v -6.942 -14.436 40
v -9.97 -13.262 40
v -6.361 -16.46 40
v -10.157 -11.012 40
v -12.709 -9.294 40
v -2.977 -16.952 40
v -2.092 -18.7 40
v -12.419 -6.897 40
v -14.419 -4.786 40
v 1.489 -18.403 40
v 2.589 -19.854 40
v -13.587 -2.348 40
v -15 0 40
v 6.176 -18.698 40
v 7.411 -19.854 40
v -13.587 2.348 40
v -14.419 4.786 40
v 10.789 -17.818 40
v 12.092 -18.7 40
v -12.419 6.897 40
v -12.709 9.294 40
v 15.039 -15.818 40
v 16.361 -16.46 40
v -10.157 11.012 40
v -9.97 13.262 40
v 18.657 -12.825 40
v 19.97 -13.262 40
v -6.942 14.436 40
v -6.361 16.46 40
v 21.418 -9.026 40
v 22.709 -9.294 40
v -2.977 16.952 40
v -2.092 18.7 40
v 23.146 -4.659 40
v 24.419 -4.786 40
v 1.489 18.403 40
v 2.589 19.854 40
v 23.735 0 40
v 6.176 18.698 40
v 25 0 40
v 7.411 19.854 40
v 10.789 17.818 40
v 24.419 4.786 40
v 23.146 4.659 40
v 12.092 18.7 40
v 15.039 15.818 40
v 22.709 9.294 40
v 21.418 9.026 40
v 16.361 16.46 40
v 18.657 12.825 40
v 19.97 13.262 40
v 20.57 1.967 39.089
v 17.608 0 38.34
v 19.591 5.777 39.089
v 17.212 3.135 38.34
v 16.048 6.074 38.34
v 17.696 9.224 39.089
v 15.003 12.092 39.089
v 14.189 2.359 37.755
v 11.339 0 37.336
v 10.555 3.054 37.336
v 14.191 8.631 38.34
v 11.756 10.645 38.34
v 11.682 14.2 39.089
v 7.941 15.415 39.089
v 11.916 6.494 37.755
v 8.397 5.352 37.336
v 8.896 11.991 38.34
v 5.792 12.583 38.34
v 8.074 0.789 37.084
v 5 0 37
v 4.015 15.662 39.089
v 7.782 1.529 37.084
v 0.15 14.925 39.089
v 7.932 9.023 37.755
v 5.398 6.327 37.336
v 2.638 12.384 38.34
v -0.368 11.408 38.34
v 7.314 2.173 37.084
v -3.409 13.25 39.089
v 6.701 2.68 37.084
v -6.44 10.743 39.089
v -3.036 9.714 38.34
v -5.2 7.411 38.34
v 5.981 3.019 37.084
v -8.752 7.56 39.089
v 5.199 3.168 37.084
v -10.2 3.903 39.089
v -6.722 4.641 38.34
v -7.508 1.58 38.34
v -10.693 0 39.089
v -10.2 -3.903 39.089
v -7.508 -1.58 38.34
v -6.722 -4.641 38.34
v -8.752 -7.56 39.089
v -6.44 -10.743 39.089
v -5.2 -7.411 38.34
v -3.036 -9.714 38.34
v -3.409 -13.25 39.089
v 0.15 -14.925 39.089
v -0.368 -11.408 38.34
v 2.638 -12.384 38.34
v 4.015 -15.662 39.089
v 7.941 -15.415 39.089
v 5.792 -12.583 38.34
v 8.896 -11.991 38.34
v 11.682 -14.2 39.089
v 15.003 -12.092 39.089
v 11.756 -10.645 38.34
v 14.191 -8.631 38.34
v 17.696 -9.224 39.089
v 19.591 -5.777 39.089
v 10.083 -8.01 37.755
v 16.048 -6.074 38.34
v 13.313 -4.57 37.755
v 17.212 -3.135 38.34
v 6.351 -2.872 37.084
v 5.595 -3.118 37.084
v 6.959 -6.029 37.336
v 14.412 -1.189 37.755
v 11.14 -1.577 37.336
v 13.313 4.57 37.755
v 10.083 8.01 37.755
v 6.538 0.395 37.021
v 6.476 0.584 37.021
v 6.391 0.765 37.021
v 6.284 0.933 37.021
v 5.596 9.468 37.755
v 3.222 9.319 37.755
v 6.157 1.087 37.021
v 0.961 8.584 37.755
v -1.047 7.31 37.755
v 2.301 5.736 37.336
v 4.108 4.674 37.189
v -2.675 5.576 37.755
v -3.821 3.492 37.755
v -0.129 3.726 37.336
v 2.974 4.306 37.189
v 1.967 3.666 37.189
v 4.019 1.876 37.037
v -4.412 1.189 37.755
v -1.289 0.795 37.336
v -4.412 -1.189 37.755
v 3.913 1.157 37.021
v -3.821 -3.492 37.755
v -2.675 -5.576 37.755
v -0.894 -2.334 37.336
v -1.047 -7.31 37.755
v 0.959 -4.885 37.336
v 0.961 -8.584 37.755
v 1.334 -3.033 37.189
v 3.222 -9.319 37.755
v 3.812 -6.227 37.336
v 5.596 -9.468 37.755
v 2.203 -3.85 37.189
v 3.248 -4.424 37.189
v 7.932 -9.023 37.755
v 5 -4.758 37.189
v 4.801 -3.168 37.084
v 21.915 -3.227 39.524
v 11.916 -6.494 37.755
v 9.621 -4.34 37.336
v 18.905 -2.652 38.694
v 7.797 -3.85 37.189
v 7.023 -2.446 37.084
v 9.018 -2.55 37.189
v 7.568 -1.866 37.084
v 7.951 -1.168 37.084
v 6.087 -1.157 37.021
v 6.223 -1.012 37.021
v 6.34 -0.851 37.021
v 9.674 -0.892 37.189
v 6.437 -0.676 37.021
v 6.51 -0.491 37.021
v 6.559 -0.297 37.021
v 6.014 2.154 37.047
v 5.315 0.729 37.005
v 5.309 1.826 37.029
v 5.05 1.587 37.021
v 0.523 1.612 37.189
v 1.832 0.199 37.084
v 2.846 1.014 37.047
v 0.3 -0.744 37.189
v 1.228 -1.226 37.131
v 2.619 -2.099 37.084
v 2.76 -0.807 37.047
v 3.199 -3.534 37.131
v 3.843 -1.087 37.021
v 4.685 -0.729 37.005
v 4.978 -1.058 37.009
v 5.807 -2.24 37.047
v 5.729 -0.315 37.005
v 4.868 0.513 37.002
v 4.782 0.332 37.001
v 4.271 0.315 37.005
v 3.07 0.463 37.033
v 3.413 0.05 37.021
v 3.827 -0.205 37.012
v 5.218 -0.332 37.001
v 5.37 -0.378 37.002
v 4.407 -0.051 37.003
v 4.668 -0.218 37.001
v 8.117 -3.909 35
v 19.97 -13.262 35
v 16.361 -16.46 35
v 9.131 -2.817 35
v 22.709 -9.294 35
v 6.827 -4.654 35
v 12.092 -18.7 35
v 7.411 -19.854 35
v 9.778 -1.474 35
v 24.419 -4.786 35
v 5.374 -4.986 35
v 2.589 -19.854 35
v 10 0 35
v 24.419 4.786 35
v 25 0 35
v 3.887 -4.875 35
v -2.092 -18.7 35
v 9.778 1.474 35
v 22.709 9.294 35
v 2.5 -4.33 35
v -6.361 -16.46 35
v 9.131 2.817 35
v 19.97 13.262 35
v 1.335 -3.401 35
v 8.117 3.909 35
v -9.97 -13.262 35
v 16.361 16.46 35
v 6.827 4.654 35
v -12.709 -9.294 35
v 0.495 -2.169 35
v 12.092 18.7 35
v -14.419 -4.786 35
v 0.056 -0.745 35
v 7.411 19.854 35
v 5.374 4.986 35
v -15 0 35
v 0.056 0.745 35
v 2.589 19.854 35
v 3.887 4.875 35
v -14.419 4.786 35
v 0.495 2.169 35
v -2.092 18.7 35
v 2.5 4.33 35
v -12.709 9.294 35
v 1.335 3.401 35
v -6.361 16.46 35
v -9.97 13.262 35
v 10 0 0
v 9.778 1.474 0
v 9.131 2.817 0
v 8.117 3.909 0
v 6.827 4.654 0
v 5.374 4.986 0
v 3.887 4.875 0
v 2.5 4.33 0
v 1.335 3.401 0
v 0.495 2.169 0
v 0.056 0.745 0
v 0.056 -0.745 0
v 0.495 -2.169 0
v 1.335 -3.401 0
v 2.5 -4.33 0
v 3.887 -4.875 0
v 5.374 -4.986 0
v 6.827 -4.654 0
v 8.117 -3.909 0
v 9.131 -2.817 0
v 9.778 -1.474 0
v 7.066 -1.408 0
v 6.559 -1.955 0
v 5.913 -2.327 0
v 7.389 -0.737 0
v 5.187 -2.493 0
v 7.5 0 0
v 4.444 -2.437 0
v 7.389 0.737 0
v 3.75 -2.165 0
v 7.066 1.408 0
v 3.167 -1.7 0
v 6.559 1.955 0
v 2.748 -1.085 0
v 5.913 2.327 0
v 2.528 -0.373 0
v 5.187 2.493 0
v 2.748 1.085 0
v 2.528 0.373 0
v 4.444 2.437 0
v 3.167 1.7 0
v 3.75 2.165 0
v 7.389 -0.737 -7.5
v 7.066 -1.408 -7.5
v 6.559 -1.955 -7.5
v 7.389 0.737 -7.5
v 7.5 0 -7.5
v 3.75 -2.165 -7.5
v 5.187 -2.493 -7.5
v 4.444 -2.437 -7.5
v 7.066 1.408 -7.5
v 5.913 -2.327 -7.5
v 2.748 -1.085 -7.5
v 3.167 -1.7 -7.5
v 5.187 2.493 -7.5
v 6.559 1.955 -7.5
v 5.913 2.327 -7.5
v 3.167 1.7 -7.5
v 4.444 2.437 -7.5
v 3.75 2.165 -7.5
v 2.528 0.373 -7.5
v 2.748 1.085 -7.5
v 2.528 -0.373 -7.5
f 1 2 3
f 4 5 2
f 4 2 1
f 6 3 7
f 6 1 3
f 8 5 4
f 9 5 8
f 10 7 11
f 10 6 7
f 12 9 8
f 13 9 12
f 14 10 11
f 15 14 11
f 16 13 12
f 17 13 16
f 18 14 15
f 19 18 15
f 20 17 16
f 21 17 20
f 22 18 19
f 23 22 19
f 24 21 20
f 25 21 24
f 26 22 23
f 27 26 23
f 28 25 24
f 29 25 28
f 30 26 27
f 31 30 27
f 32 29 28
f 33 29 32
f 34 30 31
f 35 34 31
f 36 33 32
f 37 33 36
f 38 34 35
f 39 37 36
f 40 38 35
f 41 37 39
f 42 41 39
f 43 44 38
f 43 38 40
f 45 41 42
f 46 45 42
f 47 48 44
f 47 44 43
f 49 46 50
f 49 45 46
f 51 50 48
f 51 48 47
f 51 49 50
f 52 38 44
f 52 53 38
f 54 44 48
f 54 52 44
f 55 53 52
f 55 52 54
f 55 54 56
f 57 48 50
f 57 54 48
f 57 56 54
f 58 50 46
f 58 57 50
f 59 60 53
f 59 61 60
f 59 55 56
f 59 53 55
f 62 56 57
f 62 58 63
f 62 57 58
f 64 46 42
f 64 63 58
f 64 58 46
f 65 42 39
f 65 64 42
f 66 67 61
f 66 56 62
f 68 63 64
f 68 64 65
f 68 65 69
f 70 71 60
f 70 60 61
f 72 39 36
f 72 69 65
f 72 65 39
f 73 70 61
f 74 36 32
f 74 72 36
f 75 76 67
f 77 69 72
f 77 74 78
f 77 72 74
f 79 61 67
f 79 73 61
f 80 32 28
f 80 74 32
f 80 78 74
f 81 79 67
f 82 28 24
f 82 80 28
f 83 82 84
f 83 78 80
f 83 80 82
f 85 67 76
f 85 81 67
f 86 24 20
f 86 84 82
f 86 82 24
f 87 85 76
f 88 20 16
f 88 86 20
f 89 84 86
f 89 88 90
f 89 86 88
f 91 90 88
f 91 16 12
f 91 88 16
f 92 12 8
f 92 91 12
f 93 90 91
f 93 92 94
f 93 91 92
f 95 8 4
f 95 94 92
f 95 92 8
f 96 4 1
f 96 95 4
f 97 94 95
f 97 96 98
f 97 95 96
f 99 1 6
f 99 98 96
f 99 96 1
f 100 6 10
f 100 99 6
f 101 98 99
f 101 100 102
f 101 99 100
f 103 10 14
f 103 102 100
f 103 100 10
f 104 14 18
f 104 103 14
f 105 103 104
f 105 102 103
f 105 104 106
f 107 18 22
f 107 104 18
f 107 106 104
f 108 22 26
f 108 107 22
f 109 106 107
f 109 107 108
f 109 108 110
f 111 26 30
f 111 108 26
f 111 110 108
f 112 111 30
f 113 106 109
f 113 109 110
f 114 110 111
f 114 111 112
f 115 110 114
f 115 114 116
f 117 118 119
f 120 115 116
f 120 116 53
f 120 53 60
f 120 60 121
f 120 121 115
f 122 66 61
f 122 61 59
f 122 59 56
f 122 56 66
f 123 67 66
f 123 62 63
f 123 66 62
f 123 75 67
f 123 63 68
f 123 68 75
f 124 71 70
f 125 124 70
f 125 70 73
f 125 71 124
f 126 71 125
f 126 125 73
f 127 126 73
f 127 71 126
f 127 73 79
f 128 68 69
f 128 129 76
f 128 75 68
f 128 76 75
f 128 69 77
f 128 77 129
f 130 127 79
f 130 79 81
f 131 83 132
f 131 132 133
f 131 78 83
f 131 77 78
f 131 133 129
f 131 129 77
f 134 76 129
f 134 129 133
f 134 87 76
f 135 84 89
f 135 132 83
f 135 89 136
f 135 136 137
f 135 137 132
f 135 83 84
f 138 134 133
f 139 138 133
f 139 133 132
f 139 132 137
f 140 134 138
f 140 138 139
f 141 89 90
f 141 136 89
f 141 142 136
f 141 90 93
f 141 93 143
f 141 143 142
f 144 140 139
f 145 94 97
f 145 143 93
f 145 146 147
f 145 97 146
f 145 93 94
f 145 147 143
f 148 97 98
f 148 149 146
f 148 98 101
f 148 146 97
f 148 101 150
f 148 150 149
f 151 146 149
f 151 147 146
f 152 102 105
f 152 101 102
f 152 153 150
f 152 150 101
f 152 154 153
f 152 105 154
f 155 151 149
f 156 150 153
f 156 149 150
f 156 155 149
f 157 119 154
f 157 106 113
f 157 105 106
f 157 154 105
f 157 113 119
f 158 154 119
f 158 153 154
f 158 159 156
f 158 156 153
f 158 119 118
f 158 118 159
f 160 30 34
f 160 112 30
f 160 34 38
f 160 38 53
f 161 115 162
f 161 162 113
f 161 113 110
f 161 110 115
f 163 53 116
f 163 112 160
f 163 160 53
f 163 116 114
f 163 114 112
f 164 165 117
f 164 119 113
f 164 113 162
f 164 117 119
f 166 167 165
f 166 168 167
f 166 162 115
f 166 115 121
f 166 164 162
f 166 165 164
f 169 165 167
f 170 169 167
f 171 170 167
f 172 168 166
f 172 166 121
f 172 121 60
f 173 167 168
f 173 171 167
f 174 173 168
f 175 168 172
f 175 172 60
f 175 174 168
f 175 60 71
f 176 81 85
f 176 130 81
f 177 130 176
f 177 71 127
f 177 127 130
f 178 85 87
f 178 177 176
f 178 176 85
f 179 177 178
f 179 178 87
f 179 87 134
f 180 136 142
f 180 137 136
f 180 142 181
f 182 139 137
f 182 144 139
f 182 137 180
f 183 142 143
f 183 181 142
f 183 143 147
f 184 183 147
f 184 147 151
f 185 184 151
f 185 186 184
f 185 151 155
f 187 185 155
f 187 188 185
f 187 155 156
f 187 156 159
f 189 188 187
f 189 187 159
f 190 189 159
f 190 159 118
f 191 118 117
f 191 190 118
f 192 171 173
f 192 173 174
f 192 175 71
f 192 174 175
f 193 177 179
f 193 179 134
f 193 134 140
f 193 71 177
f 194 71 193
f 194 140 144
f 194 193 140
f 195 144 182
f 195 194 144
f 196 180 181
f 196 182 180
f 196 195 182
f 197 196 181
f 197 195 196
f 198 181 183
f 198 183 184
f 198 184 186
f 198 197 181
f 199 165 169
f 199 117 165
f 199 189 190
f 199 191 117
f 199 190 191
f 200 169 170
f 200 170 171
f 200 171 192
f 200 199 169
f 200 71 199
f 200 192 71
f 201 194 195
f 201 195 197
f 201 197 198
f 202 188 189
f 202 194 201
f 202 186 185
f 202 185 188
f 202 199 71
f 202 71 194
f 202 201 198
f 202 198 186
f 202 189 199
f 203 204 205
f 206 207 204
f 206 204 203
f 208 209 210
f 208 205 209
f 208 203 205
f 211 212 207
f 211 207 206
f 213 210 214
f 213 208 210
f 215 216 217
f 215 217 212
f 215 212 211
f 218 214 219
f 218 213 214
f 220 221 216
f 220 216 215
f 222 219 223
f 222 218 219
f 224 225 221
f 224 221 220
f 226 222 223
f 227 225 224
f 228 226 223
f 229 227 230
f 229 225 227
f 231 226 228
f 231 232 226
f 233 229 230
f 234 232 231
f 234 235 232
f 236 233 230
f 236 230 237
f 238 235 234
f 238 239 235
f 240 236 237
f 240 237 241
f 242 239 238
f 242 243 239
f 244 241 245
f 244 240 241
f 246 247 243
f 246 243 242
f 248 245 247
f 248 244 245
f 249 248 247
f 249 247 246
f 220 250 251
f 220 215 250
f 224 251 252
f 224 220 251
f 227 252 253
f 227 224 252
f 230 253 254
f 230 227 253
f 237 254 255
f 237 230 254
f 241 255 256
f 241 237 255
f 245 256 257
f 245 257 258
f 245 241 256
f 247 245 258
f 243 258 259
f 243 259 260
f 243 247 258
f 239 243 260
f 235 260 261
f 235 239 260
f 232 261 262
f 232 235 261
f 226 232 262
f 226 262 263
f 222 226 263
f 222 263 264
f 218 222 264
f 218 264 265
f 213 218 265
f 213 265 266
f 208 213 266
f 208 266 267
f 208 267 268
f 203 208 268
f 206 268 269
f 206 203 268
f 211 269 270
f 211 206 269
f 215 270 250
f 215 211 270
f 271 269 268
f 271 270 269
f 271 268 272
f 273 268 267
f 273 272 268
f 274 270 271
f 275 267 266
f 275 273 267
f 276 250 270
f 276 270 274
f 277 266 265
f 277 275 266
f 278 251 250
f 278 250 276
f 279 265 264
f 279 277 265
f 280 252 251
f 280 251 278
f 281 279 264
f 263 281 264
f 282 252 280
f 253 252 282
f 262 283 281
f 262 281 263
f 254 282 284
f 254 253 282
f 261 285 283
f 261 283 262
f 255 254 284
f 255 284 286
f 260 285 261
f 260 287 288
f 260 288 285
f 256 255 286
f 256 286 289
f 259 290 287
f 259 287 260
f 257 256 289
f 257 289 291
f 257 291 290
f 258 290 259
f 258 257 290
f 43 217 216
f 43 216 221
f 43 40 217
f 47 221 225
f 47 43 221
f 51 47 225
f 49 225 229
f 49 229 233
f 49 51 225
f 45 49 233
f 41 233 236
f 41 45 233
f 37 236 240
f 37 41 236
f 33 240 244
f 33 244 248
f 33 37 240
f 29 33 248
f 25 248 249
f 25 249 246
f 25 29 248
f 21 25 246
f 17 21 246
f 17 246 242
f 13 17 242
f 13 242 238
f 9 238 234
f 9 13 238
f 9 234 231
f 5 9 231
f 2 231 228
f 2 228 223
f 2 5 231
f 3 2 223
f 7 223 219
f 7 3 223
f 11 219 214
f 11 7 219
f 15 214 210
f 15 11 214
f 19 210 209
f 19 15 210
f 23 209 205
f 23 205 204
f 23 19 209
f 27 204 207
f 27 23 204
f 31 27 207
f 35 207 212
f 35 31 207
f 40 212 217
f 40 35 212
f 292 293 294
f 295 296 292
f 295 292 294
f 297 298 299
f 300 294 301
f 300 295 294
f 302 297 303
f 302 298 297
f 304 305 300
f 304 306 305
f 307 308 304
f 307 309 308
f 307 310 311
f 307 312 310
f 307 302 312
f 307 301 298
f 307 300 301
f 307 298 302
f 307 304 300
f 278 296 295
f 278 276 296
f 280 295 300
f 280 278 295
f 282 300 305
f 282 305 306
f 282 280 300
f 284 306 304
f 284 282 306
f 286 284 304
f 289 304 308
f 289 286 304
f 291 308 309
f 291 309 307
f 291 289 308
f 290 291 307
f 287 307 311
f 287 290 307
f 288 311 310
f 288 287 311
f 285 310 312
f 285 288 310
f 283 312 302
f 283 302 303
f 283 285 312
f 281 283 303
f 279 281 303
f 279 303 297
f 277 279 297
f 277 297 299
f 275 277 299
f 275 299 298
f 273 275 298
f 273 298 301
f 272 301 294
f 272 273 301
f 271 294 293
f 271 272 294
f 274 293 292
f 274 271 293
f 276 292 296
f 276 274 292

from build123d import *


with BuildPart() as f1:
    # F0 (on Front) → F1 (revolve)
    with BuildSketch(Plane.XZ):
        Polygon((10, 35), (5, 35), (5, -7.5), (7.5, -7.5), (7.5, 0), (10, 0), align=None)
        with BuildLine():
            Line((5, 37), (5, 35))
            Line((5, 35), (10, 35))
            Line((10, 35), (25, 35))
            Line((25, 35), (25, 40))
            Line((25, 40), (23.734994, 40))
            ThreePointArc((23.734994, 40), (14.486833, 37.754747), (5, 37))
        make_face()
    revolve(axis=Axis((5, 0, 14.75), (0, 0, 1)))


solid = f1.part
